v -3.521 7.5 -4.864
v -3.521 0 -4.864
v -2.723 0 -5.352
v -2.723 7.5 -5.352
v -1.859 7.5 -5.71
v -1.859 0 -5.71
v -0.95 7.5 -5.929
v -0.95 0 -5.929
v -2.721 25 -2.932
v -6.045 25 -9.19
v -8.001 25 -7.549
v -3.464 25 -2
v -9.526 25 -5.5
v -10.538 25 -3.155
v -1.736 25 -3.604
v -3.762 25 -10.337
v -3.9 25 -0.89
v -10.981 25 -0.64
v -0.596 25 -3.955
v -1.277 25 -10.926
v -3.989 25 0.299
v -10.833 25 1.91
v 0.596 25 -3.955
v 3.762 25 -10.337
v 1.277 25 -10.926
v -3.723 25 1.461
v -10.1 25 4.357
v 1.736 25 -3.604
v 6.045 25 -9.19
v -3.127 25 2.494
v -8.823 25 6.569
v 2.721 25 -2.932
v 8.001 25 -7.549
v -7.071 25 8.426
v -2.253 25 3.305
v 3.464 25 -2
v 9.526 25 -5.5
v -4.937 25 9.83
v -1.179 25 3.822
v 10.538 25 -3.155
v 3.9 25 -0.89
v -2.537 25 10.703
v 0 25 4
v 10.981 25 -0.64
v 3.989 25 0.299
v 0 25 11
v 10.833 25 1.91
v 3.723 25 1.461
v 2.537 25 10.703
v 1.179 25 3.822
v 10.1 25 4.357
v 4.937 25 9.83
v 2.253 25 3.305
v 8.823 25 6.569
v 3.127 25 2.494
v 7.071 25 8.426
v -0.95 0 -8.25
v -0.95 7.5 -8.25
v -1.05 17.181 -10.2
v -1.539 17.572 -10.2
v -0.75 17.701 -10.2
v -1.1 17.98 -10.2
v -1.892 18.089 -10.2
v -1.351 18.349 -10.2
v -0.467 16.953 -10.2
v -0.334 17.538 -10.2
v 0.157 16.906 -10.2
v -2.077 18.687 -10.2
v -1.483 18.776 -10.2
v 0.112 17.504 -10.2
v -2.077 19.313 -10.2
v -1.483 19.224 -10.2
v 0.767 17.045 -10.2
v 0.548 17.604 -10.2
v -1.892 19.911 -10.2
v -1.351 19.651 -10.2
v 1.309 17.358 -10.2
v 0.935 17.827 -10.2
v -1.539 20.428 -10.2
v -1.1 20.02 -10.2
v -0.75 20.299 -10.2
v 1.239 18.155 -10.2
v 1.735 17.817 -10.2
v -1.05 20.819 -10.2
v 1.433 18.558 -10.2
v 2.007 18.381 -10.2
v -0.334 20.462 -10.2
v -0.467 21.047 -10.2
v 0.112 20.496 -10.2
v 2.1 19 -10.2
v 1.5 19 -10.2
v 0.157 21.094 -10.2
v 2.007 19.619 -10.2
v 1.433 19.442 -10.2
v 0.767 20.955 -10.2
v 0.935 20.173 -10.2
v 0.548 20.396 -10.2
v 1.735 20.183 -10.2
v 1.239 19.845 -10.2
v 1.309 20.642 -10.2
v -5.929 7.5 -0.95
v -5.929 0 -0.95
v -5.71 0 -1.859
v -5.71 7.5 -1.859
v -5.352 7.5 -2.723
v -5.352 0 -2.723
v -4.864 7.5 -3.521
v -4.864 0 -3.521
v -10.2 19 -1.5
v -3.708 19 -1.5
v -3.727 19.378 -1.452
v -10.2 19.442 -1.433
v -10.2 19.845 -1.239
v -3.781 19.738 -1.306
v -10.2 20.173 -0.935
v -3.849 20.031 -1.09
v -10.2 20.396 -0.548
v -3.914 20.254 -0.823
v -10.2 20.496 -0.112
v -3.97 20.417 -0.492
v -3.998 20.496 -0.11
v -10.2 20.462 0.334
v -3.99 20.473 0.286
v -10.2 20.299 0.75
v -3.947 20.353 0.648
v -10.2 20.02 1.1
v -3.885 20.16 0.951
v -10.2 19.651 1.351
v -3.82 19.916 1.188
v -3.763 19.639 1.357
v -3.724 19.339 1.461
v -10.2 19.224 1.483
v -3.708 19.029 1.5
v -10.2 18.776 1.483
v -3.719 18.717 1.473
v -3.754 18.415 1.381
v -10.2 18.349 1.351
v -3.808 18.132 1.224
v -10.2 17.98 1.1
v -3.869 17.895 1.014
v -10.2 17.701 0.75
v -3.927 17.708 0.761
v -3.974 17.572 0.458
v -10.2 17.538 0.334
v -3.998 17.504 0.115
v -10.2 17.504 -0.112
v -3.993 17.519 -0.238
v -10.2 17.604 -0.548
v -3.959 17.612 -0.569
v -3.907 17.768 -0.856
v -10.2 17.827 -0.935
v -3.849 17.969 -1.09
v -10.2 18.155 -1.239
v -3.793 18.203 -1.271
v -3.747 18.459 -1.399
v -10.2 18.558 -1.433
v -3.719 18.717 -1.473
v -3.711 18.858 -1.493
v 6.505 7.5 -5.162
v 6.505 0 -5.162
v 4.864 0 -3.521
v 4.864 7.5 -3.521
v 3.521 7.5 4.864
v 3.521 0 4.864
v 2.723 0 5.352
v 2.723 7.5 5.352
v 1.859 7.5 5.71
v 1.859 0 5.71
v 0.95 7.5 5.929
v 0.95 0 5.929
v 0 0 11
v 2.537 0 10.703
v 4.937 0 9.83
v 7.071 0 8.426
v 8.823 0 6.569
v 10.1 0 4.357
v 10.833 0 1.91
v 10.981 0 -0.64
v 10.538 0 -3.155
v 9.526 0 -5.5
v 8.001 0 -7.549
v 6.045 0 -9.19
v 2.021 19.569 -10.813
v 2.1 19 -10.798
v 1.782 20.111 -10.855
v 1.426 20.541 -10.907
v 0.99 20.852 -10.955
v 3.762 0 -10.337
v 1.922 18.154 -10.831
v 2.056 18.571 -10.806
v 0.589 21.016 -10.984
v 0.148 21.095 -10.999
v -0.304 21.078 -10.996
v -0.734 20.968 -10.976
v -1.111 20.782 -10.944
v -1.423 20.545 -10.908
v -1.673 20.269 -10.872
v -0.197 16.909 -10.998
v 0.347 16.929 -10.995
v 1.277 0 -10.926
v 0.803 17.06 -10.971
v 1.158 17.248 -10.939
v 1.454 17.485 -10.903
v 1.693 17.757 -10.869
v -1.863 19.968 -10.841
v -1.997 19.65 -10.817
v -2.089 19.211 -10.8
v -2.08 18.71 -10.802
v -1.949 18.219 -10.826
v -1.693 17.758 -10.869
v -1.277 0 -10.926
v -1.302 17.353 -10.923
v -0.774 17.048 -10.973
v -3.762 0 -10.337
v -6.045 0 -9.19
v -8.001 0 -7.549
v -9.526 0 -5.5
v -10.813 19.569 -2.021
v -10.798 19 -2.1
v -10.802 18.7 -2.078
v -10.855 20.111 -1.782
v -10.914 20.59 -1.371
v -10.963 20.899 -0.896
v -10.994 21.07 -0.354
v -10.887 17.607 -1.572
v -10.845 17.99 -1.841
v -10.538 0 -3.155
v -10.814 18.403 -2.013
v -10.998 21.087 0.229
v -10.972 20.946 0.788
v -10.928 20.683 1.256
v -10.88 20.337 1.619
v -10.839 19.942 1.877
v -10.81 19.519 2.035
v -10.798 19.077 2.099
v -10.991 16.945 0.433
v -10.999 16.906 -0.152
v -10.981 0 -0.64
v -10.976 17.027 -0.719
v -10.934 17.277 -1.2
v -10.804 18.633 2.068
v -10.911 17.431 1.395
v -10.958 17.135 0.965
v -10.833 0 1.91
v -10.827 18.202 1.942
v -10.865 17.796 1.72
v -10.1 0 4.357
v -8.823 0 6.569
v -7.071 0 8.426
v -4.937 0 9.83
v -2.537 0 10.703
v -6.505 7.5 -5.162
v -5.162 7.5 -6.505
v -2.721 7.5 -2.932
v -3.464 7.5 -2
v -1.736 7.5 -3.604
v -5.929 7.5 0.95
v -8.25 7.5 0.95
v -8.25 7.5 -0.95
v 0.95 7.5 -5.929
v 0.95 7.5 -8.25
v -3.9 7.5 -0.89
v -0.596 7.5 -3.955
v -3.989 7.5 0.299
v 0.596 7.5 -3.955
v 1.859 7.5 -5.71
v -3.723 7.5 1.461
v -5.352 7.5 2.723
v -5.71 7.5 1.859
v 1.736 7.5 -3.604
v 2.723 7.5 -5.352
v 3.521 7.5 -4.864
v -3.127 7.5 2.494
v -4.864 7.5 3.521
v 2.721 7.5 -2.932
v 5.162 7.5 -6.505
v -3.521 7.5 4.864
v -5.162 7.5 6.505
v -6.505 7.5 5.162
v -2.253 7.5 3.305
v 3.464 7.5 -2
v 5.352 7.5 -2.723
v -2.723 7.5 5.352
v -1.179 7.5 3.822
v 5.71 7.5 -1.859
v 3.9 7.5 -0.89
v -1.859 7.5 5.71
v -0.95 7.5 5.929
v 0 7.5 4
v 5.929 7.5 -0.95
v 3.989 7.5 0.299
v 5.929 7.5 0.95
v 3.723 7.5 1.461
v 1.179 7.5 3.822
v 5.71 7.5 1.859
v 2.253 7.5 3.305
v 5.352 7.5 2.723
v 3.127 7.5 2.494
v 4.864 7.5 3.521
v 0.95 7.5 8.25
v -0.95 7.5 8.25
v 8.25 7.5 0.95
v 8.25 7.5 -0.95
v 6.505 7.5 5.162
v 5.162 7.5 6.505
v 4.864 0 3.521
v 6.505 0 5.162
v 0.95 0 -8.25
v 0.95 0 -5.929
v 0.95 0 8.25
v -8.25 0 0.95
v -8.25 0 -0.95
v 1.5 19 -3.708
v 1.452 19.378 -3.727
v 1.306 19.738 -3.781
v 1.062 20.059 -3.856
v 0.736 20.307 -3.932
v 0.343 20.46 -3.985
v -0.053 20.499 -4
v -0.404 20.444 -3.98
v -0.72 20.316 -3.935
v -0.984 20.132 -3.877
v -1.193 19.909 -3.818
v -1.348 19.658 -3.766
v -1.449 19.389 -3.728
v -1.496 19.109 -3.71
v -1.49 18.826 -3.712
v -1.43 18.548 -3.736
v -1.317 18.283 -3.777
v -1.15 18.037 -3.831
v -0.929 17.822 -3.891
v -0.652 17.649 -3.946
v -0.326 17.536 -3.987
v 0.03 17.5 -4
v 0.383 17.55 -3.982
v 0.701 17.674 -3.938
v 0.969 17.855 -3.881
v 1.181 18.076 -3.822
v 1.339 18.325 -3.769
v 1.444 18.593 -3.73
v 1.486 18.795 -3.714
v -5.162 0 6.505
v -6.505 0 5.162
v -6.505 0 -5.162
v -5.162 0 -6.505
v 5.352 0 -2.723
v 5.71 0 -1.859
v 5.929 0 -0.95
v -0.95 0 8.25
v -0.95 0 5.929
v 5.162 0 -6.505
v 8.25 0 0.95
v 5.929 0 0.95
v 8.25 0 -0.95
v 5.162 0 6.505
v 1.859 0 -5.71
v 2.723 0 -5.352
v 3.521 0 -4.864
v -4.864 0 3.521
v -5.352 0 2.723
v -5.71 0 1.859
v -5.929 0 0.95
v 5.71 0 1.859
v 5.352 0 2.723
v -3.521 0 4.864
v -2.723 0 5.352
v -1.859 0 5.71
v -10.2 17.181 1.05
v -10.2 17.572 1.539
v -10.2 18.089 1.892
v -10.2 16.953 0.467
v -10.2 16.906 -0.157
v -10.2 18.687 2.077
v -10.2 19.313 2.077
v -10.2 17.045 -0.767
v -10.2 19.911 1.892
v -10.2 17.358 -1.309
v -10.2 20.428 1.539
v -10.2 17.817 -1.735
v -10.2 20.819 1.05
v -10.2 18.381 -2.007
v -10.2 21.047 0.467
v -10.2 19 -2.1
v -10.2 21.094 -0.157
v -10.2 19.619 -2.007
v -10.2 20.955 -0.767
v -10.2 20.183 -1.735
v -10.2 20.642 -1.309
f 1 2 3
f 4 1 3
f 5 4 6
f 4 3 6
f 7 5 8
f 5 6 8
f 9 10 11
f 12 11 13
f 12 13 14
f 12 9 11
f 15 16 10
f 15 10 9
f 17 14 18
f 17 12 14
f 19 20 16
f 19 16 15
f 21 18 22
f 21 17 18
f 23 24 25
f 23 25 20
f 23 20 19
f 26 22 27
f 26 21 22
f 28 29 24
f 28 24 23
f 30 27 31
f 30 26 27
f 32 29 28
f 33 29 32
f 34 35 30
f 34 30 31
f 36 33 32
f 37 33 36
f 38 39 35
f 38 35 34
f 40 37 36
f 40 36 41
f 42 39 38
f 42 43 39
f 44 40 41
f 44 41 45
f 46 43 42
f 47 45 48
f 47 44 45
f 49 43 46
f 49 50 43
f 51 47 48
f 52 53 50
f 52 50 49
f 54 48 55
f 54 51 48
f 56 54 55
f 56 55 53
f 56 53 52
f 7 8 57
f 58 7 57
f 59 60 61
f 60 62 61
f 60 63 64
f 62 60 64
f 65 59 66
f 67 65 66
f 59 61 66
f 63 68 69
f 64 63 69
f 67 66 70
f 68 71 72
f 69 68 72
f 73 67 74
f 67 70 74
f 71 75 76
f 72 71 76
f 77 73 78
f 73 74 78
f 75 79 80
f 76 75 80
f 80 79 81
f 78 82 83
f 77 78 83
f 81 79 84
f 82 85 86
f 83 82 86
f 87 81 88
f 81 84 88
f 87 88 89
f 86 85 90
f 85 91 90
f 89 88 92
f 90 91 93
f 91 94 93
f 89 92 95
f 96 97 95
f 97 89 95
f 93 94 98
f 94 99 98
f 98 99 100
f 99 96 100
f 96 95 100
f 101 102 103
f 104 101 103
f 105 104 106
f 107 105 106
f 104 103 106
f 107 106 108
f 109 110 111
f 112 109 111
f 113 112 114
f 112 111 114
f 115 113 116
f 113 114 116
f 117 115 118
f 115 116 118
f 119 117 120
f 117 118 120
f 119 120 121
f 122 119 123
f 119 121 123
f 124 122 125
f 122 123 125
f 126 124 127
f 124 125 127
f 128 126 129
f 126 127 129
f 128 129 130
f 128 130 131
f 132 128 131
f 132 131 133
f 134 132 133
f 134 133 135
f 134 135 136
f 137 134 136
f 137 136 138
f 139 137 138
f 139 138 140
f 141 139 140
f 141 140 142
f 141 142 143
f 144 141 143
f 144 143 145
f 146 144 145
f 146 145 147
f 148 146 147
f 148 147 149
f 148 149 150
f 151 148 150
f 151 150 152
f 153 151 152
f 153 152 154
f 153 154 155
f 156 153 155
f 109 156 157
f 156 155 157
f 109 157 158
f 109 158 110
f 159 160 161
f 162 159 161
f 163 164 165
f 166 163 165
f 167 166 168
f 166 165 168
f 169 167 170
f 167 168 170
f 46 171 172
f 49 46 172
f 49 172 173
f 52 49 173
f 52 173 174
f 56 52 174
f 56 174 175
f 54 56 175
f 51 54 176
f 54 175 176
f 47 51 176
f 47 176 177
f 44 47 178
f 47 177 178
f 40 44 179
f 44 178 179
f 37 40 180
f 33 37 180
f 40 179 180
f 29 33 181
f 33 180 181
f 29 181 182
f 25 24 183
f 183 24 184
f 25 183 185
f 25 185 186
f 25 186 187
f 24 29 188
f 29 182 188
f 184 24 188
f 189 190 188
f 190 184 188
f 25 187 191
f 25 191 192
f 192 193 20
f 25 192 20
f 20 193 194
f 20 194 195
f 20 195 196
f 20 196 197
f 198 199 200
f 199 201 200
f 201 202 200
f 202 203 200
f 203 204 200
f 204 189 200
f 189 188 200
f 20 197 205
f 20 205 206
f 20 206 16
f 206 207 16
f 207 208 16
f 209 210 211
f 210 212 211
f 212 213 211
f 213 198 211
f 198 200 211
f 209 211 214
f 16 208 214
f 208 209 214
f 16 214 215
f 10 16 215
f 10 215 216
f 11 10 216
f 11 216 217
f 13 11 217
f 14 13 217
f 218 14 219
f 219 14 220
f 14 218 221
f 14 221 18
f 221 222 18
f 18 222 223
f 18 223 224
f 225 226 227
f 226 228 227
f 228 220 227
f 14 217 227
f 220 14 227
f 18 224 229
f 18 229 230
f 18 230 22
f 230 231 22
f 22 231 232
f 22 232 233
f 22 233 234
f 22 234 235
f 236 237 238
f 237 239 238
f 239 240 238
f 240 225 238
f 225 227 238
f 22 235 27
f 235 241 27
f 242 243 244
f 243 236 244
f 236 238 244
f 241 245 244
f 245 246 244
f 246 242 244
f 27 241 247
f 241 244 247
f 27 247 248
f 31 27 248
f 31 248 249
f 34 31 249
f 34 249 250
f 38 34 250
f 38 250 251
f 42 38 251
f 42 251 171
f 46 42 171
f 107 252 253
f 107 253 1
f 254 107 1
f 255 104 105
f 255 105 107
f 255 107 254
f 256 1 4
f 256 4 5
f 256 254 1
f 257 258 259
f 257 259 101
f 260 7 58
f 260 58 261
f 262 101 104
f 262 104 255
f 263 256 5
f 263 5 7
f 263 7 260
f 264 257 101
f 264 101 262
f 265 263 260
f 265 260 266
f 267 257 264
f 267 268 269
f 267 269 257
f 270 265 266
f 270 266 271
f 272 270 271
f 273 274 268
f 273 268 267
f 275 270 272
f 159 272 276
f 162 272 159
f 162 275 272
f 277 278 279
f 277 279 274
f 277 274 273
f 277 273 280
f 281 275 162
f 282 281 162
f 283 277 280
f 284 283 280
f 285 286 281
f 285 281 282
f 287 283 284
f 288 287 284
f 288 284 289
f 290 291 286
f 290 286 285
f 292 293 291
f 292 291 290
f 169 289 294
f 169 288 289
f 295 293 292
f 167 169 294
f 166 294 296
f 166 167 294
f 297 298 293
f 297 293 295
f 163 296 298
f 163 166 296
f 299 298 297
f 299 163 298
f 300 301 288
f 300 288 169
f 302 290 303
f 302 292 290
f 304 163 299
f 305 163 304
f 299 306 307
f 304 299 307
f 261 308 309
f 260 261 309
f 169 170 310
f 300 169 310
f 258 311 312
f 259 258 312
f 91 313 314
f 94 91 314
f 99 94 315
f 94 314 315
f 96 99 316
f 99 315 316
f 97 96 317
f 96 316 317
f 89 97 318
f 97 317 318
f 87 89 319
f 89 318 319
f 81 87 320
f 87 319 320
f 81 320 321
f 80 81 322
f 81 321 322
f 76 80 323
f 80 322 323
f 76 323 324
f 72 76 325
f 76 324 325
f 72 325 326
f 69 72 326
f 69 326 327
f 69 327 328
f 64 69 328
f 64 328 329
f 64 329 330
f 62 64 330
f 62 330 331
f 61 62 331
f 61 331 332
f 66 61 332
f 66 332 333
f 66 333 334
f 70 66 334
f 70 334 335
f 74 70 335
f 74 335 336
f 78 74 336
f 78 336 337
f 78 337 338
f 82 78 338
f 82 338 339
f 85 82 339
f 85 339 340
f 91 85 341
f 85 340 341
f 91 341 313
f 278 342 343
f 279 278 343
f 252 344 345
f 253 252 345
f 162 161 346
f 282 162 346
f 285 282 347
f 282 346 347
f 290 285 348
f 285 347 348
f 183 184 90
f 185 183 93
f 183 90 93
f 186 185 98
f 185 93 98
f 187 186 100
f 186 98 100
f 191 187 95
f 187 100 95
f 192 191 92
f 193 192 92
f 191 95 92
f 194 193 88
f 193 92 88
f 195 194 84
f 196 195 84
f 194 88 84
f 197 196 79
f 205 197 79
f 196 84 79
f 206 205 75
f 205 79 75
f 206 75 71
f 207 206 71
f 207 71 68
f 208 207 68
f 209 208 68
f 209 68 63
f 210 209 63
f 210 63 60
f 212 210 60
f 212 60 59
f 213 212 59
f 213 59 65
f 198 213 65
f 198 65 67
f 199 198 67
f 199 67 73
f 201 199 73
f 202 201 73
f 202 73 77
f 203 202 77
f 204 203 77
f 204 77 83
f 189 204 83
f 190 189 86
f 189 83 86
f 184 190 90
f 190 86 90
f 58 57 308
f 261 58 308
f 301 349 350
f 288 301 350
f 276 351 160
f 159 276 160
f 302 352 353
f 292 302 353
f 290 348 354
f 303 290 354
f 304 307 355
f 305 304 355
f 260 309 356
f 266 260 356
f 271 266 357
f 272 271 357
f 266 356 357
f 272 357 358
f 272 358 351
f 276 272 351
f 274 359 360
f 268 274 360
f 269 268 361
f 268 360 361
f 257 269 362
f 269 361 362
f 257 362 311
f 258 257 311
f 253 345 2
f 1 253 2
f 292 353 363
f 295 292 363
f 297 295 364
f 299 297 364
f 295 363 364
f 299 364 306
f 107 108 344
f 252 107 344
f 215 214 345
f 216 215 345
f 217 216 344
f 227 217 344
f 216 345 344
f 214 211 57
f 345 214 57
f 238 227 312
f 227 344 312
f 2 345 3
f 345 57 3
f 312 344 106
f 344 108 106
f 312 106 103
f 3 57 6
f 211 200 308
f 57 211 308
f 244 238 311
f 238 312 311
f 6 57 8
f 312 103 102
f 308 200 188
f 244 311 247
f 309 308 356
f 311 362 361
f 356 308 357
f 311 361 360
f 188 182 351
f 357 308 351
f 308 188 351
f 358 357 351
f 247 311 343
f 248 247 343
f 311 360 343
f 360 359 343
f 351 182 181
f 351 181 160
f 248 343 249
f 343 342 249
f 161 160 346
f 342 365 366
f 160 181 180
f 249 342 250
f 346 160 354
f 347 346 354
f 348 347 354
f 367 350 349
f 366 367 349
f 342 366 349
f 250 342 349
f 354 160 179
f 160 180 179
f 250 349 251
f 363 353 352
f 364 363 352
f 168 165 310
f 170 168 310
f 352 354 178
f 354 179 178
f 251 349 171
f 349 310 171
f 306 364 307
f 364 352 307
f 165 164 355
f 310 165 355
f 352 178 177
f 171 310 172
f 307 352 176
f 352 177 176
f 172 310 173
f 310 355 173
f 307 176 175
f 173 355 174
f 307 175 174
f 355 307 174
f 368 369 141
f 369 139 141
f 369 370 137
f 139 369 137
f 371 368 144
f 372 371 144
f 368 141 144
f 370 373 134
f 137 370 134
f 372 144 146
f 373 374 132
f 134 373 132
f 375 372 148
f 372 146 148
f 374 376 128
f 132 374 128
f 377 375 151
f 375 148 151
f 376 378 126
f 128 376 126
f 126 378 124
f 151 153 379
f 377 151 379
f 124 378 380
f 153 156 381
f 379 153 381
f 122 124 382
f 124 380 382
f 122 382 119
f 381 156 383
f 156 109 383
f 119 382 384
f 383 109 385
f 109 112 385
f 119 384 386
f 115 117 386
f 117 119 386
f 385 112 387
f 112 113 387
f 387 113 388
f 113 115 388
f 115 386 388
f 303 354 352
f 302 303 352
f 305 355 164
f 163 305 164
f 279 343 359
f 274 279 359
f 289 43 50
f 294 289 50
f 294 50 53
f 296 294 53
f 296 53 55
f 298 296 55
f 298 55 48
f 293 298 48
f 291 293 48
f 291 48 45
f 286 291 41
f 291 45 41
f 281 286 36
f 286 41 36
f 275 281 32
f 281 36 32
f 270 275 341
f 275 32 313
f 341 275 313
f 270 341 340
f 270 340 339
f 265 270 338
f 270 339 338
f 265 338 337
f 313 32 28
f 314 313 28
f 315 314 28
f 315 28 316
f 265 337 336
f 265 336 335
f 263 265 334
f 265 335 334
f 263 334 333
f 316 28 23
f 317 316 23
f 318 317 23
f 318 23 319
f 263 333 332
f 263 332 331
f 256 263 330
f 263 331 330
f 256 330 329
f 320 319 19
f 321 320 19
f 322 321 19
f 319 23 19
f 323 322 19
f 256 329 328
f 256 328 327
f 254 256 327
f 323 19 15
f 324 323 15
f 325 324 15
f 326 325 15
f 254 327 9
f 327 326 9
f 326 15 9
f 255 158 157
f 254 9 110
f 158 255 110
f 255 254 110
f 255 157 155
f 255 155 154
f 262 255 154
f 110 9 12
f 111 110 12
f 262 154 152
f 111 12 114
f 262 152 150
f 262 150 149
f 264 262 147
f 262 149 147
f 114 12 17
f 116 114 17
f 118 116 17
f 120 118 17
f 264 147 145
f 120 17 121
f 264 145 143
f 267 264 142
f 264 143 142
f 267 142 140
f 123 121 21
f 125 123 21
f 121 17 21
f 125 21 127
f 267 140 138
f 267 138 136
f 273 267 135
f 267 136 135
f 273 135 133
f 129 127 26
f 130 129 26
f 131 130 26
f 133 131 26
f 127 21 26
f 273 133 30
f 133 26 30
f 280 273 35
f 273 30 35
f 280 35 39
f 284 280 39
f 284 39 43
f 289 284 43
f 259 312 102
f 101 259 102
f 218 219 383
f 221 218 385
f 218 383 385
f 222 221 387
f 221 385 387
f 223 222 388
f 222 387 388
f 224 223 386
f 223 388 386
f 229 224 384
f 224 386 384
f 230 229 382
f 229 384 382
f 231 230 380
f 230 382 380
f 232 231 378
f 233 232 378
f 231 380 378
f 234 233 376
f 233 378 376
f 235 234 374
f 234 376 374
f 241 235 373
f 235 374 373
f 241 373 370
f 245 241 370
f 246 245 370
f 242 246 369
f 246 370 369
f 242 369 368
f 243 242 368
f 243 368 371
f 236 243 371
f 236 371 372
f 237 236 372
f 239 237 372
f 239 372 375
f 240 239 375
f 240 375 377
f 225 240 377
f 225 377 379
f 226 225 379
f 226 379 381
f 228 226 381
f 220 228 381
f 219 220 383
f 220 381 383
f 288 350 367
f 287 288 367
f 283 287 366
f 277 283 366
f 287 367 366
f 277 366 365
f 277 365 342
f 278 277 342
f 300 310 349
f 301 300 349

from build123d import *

# Parameters (mm, degrees)
SKETCH1_R           = 11
BOSS_EXTRUDE1_DEPTH = 25
SKETCH2_R           = 4
CUT_EXTRUDE1_DEPTH  = 30.444863729
CUT_EXTRUDE2_DEPTH  = 7.5
SKETCH4_R           = 1.5
CUT_EXTRUDE3_DEPTH  = 30.444863729
SKETCH5_R           = 1.5
CUT_EXTRUDE4_DEPTH  = 30.444863896
CUT_EXTRUDE5_START  = -10.2
SKETCH7_R           = 2.1
CUT_EXTRUDE5_DEPTH  = 10
CUT_EXTRUDE6_START  = -10.2
SKETCH8_R           = 2.1
CUT_EXTRUDE6_DEPTH  = 10


with BuildPart() as part:
    # Sketch1 → Boss-Extrude1 (new body)
    with BuildSketch(Plane(origin=(0, 0, 0), x_dir=(1, 0, 0), z_dir=(0, 1, 0))):
        with Locations(Location((0, 0, 0), (0, 0, 270))):
            Circle(SKETCH1_R)
    extrude(amount=BOSS_EXTRUDE1_DEPTH)

    # Sketch2 → Cut-Extrude1 (cut, through all)
    with BuildSketch(Plane(origin=(0, 25, 0), x_dir=(1, 0, 0), z_dir=(0, 1, 0))):
        with Locations(Location((0, 0, 0), (0, 0, 270))):
            Circle(SKETCH2_R)
    extrude(amount=-CUT_EXTRUDE1_DEPTH, mode=Mode.SUBTRACT)

    # Sketch3 → Cut-Extrude2 (cut)
    with BuildSketch(Plane.XZ):
        with BuildLine():
            Line((4.864454926, 3.520952041), (6.505382387, 5.161879503))
            Line((6.505382387, 5.161879503), (5.161879503, 6.505382387))
            Line((5.161879503, 6.505382387), (3.520952041, 4.864454926))
            ThreePointArc((3.520952041, 4.864454926), (2.298014011, 5.547896593), (0.95, 5.929378129))
            Line((0.95, 5.929378129), (0.95, 8.25))
            Line((0.95, 8.25), (-0.95, 8.25))
            Line((-0.95, 8.25), (-0.95, 5.929378129))
            ThreePointArc((-0.95, 5.929378129), (-2.298014011, 5.547896593), (-3.520952041, 4.864454926))
            Line((-3.520952041, 4.864454926), (-5.161879503, 6.505382387))
            Line((-5.161879503, 6.505382387), (-6.505382387, 5.161879503))
            Line((-6.505382387, 5.161879503), (-4.864454926, 3.520952041))
            ThreePointArc((-4.864454926, 3.520952041), (-5.547896593, 2.298014011), (-5.929378129, 0.95))
            Line((-5.929378129, 0.95), (-8.25, 0.95))
            Line((-8.25, 0.95), (-8.25, -0.95))
            Line((-8.25, -0.95), (-5.929378129, -0.95))
            ThreePointArc((-5.929378129, -0.95), (-5.547896593, -2.298014011), (-4.864454926, -3.520952041))
            Line((-4.864454926, -3.520952041), (-6.505382387, -5.161879503))
            Line((-6.505382387, -5.161879503), (-5.161879503, -6.505382387))
            Line((-5.161879503, -6.505382387), (-3.520952041, -4.864454926))
            ThreePointArc((-3.520952041, -4.864454926), (-2.298014011, -5.547896593), (-0.95, -5.929378129))
            Line((-0.95, -5.929378129), (-0.95, -8.25))
            Line((-0.95, -8.25), (0.95, -8.25))
            Line((0.95, -8.25), (0.95, -5.929378129))
            ThreePointArc((0.95, -5.929378129), (2.298014011, -5.547896593), (3.520952041, -4.864454926))
            Line((3.520952041, -4.864454926), (5.161879503, -6.505382387))
            Line((5.161879503, -6.505382387), (6.505382387, -5.161879503))
            Line((6.505382387, -5.161879503), (4.864454926, -3.520952041))
            ThreePointArc((4.864454926, -3.520952041), (5.547896593, -2.298014011), (5.929378129, -0.95))
            Line((5.929378129, -0.95), (8.25, -0.95))
            Line((8.25, -0.95), (8.25, 0.95))
            Line((8.25, 0.95), (5.929378129, 0.95))
            ThreePointArc((5.929378129, 0.95), (5.547896593, 2.298014011), (4.864454926, 3.520952041))
        make_face()
    extrude(amount=-CUT_EXTRUDE2_DEPTH, mode=Mode.SUBTRACT)

    # Sketch4 → Cut-Extrude3 (cut, through all)
    with BuildSketch(Plane.XY):
        with Locations((0, 19)):
            Circle(SKETCH4_R)
    extrude(amount=-CUT_EXTRUDE3_DEPTH, mode=Mode.SUBTRACT)

    # Sketch5 → Cut-Extrude4 (cut, through all)
    with BuildSketch(Plane(origin=(0, 0, 0), x_dir=(0, 0, -1), z_dir=(1, 0, 0))):
        with Locations((0, 19)):
            Circle(SKETCH5_R)
    extrude(amount=-CUT_EXTRUDE4_DEPTH, mode=Mode.SUBTRACT)

    # Sketch7 → Cut-Extrude5 (cut)
    with BuildSketch(Plane.XY.offset(CUT_EXTRUDE5_START)):
        with Locations((0, 19)):
            Circle(SKETCH7_R)
    extrude(amount=-CUT_EXTRUDE5_DEPTH, mode=Mode.SUBTRACT)

    # Sketch8 → Cut-Extrude6 (cut)
    with BuildSketch(Plane(origin=(0, 0, 0), x_dir=(0, 0, -1), z_dir=(1, 0, 0)).offset(CUT_EXTRUDE6_START)):
        with Locations((0, 19)):
            Circle(SKETCH8_R)
    extrude(amount=-CUT_EXTRUDE6_DEPTH, mode=Mode.SUBTRACT)


solid = part.part
